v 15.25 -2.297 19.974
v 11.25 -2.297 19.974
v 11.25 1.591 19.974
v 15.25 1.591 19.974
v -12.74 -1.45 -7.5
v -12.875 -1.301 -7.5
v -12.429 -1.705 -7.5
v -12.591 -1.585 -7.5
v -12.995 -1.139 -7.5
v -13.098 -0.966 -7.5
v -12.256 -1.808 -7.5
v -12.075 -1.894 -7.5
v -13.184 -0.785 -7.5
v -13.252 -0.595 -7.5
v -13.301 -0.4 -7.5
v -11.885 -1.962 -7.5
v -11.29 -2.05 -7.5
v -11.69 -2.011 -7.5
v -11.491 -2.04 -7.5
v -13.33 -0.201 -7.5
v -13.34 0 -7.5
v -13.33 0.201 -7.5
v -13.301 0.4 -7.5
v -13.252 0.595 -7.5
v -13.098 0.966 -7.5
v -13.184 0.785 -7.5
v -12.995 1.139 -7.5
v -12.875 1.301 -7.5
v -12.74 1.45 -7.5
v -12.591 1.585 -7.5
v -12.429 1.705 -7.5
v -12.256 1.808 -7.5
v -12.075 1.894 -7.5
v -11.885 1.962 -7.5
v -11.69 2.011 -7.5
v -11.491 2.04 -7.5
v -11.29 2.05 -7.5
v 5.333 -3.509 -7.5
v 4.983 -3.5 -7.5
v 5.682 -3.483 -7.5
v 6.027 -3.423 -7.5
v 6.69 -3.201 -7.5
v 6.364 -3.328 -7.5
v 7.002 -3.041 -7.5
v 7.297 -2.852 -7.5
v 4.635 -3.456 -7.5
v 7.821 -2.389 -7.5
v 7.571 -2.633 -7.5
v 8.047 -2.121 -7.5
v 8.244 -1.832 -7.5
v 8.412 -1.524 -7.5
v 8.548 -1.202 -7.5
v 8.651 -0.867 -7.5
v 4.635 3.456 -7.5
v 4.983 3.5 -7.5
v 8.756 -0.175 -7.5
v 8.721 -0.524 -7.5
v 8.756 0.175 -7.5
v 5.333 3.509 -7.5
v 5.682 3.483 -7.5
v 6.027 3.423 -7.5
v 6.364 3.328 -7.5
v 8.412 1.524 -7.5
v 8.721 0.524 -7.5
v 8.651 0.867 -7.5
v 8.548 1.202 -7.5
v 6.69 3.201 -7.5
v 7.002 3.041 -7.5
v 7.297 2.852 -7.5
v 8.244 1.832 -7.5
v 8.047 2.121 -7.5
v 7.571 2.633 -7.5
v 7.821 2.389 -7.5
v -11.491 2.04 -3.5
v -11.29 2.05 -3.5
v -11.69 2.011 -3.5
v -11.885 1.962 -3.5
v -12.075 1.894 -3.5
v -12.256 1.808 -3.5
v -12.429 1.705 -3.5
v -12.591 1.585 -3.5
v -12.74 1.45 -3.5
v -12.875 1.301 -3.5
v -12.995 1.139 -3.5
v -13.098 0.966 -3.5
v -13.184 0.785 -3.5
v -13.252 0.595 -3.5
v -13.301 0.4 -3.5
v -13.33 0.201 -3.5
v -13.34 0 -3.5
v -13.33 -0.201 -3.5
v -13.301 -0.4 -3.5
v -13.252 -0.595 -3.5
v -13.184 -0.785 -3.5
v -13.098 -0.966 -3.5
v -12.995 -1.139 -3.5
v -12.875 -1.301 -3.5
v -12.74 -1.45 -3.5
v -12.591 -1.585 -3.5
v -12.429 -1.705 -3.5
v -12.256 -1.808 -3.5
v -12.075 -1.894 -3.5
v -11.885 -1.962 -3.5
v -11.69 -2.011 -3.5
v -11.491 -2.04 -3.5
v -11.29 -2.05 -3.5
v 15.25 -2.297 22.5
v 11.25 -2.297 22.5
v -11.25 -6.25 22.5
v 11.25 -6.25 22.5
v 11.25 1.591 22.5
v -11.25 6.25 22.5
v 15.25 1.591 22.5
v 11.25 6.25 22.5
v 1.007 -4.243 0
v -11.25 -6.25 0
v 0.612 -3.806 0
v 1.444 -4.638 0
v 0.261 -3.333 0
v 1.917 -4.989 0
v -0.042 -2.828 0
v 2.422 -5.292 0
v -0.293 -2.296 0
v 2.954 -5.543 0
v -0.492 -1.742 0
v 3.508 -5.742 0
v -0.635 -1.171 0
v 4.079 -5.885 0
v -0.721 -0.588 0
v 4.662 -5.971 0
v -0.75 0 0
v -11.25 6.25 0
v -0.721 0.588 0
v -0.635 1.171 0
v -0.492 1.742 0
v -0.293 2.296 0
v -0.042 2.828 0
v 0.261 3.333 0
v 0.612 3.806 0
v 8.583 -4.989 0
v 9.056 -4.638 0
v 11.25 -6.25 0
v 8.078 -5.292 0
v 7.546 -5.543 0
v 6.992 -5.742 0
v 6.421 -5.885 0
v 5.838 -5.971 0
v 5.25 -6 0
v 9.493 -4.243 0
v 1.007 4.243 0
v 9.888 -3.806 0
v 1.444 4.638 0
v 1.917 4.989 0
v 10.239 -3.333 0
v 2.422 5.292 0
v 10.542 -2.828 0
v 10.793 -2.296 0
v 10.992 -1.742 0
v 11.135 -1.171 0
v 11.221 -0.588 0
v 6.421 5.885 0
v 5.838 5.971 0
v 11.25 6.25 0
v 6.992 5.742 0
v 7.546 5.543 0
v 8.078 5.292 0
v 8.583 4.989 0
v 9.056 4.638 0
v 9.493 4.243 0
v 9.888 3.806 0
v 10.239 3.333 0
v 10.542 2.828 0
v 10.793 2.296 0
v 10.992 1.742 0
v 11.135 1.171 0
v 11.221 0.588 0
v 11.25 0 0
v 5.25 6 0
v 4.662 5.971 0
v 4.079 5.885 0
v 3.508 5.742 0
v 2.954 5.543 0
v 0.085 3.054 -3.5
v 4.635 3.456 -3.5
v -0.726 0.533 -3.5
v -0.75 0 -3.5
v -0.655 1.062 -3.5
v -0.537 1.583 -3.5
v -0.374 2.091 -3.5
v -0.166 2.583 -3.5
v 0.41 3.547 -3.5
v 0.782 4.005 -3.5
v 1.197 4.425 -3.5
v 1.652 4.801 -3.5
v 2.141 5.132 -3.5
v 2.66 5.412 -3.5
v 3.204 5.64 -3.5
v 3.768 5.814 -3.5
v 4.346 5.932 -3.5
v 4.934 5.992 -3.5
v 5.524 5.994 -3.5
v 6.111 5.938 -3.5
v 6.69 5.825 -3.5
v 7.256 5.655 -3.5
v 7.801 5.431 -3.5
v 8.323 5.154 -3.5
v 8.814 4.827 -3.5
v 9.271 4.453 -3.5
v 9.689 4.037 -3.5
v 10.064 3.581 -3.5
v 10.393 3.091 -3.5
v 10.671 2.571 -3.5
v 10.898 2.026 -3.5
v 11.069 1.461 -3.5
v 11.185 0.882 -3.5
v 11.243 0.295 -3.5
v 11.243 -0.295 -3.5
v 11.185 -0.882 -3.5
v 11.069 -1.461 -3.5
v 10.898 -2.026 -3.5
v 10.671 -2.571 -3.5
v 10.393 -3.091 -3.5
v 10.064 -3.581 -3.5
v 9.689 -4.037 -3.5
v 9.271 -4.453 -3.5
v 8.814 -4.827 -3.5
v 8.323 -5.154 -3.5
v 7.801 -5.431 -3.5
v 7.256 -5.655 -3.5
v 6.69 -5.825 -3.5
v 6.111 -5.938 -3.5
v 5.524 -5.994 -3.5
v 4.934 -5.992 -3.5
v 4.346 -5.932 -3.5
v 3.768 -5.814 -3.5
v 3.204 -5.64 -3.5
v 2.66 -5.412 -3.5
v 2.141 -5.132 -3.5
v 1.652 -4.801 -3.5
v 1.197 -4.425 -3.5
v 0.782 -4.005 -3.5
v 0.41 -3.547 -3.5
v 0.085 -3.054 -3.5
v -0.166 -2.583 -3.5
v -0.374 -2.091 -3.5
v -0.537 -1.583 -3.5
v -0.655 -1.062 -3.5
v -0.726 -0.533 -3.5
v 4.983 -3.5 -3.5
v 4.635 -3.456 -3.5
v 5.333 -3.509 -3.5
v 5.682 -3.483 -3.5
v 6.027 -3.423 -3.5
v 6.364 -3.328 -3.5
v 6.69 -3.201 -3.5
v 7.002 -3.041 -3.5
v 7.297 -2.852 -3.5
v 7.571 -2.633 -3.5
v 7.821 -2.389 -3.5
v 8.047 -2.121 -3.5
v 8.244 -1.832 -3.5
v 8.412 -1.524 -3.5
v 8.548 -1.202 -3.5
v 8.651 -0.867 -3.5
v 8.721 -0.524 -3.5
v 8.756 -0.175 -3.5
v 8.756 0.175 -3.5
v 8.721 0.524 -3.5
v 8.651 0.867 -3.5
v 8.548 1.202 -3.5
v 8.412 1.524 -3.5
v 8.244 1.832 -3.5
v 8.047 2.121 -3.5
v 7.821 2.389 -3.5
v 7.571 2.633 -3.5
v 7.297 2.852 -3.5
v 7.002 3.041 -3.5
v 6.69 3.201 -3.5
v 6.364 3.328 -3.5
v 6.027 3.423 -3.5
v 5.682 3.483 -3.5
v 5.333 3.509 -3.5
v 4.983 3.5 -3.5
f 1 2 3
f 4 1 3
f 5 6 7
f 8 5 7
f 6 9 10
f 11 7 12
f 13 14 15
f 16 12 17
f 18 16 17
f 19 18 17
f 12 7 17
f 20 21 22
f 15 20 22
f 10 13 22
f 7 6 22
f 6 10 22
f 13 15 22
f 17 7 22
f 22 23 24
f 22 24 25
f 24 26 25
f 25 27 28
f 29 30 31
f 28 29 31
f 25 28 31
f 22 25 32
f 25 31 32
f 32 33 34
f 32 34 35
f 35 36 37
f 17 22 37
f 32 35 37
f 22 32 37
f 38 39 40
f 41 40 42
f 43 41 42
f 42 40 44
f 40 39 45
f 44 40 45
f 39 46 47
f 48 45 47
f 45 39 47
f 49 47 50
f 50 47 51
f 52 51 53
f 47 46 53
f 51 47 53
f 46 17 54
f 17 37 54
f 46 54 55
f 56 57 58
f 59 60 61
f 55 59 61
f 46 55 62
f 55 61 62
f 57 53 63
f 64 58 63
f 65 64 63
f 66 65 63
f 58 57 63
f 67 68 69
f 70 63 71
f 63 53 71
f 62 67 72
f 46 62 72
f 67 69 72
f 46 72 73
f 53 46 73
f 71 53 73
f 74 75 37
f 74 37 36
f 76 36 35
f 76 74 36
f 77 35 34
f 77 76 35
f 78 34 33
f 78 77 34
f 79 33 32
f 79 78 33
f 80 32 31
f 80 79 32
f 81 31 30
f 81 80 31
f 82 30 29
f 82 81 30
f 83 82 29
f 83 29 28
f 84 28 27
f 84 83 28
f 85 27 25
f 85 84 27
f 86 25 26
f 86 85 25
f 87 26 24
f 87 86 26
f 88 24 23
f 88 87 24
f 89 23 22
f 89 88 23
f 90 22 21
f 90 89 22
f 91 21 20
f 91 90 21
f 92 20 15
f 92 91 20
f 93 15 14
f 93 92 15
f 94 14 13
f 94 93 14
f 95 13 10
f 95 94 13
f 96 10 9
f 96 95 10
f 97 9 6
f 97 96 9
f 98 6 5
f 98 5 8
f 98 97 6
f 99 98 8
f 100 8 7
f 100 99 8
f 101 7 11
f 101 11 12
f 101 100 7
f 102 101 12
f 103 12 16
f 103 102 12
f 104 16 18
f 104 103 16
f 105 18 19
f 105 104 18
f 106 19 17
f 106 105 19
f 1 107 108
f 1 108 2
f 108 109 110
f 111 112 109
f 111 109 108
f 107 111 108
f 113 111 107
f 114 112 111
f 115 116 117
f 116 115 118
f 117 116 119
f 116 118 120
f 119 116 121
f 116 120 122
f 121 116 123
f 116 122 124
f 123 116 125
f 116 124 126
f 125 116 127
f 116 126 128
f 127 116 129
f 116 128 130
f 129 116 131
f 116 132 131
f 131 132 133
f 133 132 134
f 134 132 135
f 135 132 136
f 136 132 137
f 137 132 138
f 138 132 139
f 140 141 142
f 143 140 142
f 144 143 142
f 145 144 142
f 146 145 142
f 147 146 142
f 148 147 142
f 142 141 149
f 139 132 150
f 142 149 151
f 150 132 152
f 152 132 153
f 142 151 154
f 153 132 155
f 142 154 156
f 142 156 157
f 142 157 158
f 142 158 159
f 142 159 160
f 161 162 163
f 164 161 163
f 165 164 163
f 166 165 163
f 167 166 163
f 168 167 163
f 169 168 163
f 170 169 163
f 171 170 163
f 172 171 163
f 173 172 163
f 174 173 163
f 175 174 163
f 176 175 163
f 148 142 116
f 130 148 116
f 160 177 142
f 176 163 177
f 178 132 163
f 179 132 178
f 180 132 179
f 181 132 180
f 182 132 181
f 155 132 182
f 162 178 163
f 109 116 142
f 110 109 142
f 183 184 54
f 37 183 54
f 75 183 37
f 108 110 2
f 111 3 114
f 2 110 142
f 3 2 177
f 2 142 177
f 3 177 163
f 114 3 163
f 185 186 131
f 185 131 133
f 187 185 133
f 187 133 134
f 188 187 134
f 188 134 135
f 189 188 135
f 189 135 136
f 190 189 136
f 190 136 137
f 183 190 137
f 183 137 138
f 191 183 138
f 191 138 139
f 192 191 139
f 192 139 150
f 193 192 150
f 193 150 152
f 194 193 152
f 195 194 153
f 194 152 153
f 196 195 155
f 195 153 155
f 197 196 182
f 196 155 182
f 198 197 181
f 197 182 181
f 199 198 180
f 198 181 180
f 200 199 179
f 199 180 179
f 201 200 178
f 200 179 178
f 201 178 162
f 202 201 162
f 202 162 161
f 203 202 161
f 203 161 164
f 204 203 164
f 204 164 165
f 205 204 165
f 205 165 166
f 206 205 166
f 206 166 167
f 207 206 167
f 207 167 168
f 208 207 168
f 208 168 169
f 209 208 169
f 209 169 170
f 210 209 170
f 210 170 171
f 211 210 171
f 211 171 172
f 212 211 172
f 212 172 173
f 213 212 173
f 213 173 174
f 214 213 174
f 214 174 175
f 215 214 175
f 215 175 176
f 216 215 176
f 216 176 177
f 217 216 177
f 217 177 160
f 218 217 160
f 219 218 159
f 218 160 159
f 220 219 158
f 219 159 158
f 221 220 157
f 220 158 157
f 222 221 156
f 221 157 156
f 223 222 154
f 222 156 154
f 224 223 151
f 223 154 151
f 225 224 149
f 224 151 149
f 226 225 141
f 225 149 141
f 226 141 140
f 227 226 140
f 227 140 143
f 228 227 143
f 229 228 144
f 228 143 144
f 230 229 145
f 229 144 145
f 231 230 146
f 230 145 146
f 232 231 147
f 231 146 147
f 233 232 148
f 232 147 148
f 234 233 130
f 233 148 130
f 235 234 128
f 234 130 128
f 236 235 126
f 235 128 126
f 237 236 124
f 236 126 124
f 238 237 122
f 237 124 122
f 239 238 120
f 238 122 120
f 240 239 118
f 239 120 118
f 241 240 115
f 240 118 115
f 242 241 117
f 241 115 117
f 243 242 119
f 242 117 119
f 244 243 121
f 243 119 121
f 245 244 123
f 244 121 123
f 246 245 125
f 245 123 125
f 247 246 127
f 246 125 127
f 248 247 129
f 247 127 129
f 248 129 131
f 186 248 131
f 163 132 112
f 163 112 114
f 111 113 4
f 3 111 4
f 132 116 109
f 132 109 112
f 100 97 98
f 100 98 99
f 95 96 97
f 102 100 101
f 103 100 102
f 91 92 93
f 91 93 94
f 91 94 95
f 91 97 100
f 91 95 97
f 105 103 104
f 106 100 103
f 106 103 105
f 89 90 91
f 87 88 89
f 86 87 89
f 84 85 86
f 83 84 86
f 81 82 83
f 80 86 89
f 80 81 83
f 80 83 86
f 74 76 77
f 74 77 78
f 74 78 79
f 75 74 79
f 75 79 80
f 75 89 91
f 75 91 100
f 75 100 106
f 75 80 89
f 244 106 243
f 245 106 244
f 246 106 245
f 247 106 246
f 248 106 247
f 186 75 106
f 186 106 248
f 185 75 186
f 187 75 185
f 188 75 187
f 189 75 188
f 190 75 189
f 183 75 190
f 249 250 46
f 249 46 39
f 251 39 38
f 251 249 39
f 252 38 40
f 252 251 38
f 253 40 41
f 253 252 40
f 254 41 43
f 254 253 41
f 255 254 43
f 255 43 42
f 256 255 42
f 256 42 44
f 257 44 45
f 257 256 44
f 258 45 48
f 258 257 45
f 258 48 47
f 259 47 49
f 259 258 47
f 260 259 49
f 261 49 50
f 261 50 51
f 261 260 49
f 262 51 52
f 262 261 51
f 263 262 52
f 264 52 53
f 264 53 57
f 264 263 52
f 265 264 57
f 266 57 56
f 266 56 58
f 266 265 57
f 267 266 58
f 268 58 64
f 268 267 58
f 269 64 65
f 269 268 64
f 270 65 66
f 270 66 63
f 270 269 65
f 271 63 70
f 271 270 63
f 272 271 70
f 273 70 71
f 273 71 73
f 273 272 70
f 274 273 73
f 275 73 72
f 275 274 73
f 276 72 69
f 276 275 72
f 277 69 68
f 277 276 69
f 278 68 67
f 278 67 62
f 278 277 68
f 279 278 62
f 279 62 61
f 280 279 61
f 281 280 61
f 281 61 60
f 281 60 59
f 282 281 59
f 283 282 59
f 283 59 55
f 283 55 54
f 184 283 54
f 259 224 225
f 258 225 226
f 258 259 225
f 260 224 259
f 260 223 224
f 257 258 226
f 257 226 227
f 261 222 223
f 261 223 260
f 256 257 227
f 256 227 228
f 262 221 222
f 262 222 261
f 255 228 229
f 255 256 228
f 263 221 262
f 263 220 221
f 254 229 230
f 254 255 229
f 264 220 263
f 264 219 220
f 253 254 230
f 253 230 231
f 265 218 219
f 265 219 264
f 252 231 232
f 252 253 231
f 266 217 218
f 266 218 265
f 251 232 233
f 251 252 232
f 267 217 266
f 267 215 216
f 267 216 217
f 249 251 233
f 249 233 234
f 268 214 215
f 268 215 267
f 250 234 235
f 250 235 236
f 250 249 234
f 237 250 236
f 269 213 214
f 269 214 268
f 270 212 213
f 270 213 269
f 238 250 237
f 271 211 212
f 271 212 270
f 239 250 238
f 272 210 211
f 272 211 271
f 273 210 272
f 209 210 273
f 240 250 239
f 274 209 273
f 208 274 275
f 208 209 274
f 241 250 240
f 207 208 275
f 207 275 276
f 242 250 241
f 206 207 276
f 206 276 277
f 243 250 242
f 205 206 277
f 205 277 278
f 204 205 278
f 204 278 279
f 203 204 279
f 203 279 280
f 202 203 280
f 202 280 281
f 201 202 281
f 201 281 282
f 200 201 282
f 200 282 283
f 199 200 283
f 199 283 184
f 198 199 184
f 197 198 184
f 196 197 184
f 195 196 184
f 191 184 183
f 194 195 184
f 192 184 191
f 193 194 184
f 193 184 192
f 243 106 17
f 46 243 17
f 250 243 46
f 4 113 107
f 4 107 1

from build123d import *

# Parameters (mm, degrees)
SKETCH1_W           = 22.5
SKETCH1_H           = 12.5
BOSS_EXTRUDE1_DEPTH = 22.5
SKETCH2_R           = 6
BOSS_EXTRUDE2_DEPTH = 3.5
BOSS_EXTRUDE4_DEPTH = 4
SKETCH6_W           = 2.526093831
SKETCH6_H           = 3.888015028
BOSS_EXTRUDE5_DEPTH = 4


with BuildPart() as part:
    # Sketch1 → Boss-Extrude1 (new body)
    with BuildSketch(Plane.XY):
        Rectangle(SKETCH1_W, SKETCH1_H)
    extrude(amount=BOSS_EXTRUDE1_DEPTH)

    # Sketch2 → Boss-Extrude2 (add)
    with BuildSketch(Plane(origin=(0, 0, 0), x_dir=(-1, 0, 0), z_dir=(0, 0, -1))):
        with Locations((-5.25, 0)):
            Circle(SKETCH2_R)
    extrude(amount=BOSS_EXTRUDE2_DEPTH)

    # Sketch5 → Boss-Extrude4 (add)
    with BuildSketch(Plane(origin=(0, 0, -3.5), x_dir=(-1, 0, 0), z_dir=(0, 0, -1))):
        with BuildLine():
            Line((-4.635129487, 3.455724852), (11.29, 2.05))
            ThreePointArc((11.29, 2.05), (13.34, 0), (11.29, -2.05))
            Line((11.29, -2.05), (-4.635129487, -3.455724852))
            ThreePointArc((-4.635129487, -3.455724852), (-8.76, 0), (-4.635129487, 3.455724852))
        make_face()
    extrude(amount=BOSS_EXTRUDE4_DEPTH)

    # Sketch6 → Boss-Extrude5 (add)
    with BuildSketch(Plane(origin=(11.25, 0, 0), x_dir=(0, 0, -1), z_dir=(1, 0, 0))):
        with Locations((-21.236953085, -0.353333214)):
            Rectangle(SKETCH6_W, SKETCH6_H)
    extrude(amount=BOSS_EXTRUDE5_DEPTH)


solid = part.part
